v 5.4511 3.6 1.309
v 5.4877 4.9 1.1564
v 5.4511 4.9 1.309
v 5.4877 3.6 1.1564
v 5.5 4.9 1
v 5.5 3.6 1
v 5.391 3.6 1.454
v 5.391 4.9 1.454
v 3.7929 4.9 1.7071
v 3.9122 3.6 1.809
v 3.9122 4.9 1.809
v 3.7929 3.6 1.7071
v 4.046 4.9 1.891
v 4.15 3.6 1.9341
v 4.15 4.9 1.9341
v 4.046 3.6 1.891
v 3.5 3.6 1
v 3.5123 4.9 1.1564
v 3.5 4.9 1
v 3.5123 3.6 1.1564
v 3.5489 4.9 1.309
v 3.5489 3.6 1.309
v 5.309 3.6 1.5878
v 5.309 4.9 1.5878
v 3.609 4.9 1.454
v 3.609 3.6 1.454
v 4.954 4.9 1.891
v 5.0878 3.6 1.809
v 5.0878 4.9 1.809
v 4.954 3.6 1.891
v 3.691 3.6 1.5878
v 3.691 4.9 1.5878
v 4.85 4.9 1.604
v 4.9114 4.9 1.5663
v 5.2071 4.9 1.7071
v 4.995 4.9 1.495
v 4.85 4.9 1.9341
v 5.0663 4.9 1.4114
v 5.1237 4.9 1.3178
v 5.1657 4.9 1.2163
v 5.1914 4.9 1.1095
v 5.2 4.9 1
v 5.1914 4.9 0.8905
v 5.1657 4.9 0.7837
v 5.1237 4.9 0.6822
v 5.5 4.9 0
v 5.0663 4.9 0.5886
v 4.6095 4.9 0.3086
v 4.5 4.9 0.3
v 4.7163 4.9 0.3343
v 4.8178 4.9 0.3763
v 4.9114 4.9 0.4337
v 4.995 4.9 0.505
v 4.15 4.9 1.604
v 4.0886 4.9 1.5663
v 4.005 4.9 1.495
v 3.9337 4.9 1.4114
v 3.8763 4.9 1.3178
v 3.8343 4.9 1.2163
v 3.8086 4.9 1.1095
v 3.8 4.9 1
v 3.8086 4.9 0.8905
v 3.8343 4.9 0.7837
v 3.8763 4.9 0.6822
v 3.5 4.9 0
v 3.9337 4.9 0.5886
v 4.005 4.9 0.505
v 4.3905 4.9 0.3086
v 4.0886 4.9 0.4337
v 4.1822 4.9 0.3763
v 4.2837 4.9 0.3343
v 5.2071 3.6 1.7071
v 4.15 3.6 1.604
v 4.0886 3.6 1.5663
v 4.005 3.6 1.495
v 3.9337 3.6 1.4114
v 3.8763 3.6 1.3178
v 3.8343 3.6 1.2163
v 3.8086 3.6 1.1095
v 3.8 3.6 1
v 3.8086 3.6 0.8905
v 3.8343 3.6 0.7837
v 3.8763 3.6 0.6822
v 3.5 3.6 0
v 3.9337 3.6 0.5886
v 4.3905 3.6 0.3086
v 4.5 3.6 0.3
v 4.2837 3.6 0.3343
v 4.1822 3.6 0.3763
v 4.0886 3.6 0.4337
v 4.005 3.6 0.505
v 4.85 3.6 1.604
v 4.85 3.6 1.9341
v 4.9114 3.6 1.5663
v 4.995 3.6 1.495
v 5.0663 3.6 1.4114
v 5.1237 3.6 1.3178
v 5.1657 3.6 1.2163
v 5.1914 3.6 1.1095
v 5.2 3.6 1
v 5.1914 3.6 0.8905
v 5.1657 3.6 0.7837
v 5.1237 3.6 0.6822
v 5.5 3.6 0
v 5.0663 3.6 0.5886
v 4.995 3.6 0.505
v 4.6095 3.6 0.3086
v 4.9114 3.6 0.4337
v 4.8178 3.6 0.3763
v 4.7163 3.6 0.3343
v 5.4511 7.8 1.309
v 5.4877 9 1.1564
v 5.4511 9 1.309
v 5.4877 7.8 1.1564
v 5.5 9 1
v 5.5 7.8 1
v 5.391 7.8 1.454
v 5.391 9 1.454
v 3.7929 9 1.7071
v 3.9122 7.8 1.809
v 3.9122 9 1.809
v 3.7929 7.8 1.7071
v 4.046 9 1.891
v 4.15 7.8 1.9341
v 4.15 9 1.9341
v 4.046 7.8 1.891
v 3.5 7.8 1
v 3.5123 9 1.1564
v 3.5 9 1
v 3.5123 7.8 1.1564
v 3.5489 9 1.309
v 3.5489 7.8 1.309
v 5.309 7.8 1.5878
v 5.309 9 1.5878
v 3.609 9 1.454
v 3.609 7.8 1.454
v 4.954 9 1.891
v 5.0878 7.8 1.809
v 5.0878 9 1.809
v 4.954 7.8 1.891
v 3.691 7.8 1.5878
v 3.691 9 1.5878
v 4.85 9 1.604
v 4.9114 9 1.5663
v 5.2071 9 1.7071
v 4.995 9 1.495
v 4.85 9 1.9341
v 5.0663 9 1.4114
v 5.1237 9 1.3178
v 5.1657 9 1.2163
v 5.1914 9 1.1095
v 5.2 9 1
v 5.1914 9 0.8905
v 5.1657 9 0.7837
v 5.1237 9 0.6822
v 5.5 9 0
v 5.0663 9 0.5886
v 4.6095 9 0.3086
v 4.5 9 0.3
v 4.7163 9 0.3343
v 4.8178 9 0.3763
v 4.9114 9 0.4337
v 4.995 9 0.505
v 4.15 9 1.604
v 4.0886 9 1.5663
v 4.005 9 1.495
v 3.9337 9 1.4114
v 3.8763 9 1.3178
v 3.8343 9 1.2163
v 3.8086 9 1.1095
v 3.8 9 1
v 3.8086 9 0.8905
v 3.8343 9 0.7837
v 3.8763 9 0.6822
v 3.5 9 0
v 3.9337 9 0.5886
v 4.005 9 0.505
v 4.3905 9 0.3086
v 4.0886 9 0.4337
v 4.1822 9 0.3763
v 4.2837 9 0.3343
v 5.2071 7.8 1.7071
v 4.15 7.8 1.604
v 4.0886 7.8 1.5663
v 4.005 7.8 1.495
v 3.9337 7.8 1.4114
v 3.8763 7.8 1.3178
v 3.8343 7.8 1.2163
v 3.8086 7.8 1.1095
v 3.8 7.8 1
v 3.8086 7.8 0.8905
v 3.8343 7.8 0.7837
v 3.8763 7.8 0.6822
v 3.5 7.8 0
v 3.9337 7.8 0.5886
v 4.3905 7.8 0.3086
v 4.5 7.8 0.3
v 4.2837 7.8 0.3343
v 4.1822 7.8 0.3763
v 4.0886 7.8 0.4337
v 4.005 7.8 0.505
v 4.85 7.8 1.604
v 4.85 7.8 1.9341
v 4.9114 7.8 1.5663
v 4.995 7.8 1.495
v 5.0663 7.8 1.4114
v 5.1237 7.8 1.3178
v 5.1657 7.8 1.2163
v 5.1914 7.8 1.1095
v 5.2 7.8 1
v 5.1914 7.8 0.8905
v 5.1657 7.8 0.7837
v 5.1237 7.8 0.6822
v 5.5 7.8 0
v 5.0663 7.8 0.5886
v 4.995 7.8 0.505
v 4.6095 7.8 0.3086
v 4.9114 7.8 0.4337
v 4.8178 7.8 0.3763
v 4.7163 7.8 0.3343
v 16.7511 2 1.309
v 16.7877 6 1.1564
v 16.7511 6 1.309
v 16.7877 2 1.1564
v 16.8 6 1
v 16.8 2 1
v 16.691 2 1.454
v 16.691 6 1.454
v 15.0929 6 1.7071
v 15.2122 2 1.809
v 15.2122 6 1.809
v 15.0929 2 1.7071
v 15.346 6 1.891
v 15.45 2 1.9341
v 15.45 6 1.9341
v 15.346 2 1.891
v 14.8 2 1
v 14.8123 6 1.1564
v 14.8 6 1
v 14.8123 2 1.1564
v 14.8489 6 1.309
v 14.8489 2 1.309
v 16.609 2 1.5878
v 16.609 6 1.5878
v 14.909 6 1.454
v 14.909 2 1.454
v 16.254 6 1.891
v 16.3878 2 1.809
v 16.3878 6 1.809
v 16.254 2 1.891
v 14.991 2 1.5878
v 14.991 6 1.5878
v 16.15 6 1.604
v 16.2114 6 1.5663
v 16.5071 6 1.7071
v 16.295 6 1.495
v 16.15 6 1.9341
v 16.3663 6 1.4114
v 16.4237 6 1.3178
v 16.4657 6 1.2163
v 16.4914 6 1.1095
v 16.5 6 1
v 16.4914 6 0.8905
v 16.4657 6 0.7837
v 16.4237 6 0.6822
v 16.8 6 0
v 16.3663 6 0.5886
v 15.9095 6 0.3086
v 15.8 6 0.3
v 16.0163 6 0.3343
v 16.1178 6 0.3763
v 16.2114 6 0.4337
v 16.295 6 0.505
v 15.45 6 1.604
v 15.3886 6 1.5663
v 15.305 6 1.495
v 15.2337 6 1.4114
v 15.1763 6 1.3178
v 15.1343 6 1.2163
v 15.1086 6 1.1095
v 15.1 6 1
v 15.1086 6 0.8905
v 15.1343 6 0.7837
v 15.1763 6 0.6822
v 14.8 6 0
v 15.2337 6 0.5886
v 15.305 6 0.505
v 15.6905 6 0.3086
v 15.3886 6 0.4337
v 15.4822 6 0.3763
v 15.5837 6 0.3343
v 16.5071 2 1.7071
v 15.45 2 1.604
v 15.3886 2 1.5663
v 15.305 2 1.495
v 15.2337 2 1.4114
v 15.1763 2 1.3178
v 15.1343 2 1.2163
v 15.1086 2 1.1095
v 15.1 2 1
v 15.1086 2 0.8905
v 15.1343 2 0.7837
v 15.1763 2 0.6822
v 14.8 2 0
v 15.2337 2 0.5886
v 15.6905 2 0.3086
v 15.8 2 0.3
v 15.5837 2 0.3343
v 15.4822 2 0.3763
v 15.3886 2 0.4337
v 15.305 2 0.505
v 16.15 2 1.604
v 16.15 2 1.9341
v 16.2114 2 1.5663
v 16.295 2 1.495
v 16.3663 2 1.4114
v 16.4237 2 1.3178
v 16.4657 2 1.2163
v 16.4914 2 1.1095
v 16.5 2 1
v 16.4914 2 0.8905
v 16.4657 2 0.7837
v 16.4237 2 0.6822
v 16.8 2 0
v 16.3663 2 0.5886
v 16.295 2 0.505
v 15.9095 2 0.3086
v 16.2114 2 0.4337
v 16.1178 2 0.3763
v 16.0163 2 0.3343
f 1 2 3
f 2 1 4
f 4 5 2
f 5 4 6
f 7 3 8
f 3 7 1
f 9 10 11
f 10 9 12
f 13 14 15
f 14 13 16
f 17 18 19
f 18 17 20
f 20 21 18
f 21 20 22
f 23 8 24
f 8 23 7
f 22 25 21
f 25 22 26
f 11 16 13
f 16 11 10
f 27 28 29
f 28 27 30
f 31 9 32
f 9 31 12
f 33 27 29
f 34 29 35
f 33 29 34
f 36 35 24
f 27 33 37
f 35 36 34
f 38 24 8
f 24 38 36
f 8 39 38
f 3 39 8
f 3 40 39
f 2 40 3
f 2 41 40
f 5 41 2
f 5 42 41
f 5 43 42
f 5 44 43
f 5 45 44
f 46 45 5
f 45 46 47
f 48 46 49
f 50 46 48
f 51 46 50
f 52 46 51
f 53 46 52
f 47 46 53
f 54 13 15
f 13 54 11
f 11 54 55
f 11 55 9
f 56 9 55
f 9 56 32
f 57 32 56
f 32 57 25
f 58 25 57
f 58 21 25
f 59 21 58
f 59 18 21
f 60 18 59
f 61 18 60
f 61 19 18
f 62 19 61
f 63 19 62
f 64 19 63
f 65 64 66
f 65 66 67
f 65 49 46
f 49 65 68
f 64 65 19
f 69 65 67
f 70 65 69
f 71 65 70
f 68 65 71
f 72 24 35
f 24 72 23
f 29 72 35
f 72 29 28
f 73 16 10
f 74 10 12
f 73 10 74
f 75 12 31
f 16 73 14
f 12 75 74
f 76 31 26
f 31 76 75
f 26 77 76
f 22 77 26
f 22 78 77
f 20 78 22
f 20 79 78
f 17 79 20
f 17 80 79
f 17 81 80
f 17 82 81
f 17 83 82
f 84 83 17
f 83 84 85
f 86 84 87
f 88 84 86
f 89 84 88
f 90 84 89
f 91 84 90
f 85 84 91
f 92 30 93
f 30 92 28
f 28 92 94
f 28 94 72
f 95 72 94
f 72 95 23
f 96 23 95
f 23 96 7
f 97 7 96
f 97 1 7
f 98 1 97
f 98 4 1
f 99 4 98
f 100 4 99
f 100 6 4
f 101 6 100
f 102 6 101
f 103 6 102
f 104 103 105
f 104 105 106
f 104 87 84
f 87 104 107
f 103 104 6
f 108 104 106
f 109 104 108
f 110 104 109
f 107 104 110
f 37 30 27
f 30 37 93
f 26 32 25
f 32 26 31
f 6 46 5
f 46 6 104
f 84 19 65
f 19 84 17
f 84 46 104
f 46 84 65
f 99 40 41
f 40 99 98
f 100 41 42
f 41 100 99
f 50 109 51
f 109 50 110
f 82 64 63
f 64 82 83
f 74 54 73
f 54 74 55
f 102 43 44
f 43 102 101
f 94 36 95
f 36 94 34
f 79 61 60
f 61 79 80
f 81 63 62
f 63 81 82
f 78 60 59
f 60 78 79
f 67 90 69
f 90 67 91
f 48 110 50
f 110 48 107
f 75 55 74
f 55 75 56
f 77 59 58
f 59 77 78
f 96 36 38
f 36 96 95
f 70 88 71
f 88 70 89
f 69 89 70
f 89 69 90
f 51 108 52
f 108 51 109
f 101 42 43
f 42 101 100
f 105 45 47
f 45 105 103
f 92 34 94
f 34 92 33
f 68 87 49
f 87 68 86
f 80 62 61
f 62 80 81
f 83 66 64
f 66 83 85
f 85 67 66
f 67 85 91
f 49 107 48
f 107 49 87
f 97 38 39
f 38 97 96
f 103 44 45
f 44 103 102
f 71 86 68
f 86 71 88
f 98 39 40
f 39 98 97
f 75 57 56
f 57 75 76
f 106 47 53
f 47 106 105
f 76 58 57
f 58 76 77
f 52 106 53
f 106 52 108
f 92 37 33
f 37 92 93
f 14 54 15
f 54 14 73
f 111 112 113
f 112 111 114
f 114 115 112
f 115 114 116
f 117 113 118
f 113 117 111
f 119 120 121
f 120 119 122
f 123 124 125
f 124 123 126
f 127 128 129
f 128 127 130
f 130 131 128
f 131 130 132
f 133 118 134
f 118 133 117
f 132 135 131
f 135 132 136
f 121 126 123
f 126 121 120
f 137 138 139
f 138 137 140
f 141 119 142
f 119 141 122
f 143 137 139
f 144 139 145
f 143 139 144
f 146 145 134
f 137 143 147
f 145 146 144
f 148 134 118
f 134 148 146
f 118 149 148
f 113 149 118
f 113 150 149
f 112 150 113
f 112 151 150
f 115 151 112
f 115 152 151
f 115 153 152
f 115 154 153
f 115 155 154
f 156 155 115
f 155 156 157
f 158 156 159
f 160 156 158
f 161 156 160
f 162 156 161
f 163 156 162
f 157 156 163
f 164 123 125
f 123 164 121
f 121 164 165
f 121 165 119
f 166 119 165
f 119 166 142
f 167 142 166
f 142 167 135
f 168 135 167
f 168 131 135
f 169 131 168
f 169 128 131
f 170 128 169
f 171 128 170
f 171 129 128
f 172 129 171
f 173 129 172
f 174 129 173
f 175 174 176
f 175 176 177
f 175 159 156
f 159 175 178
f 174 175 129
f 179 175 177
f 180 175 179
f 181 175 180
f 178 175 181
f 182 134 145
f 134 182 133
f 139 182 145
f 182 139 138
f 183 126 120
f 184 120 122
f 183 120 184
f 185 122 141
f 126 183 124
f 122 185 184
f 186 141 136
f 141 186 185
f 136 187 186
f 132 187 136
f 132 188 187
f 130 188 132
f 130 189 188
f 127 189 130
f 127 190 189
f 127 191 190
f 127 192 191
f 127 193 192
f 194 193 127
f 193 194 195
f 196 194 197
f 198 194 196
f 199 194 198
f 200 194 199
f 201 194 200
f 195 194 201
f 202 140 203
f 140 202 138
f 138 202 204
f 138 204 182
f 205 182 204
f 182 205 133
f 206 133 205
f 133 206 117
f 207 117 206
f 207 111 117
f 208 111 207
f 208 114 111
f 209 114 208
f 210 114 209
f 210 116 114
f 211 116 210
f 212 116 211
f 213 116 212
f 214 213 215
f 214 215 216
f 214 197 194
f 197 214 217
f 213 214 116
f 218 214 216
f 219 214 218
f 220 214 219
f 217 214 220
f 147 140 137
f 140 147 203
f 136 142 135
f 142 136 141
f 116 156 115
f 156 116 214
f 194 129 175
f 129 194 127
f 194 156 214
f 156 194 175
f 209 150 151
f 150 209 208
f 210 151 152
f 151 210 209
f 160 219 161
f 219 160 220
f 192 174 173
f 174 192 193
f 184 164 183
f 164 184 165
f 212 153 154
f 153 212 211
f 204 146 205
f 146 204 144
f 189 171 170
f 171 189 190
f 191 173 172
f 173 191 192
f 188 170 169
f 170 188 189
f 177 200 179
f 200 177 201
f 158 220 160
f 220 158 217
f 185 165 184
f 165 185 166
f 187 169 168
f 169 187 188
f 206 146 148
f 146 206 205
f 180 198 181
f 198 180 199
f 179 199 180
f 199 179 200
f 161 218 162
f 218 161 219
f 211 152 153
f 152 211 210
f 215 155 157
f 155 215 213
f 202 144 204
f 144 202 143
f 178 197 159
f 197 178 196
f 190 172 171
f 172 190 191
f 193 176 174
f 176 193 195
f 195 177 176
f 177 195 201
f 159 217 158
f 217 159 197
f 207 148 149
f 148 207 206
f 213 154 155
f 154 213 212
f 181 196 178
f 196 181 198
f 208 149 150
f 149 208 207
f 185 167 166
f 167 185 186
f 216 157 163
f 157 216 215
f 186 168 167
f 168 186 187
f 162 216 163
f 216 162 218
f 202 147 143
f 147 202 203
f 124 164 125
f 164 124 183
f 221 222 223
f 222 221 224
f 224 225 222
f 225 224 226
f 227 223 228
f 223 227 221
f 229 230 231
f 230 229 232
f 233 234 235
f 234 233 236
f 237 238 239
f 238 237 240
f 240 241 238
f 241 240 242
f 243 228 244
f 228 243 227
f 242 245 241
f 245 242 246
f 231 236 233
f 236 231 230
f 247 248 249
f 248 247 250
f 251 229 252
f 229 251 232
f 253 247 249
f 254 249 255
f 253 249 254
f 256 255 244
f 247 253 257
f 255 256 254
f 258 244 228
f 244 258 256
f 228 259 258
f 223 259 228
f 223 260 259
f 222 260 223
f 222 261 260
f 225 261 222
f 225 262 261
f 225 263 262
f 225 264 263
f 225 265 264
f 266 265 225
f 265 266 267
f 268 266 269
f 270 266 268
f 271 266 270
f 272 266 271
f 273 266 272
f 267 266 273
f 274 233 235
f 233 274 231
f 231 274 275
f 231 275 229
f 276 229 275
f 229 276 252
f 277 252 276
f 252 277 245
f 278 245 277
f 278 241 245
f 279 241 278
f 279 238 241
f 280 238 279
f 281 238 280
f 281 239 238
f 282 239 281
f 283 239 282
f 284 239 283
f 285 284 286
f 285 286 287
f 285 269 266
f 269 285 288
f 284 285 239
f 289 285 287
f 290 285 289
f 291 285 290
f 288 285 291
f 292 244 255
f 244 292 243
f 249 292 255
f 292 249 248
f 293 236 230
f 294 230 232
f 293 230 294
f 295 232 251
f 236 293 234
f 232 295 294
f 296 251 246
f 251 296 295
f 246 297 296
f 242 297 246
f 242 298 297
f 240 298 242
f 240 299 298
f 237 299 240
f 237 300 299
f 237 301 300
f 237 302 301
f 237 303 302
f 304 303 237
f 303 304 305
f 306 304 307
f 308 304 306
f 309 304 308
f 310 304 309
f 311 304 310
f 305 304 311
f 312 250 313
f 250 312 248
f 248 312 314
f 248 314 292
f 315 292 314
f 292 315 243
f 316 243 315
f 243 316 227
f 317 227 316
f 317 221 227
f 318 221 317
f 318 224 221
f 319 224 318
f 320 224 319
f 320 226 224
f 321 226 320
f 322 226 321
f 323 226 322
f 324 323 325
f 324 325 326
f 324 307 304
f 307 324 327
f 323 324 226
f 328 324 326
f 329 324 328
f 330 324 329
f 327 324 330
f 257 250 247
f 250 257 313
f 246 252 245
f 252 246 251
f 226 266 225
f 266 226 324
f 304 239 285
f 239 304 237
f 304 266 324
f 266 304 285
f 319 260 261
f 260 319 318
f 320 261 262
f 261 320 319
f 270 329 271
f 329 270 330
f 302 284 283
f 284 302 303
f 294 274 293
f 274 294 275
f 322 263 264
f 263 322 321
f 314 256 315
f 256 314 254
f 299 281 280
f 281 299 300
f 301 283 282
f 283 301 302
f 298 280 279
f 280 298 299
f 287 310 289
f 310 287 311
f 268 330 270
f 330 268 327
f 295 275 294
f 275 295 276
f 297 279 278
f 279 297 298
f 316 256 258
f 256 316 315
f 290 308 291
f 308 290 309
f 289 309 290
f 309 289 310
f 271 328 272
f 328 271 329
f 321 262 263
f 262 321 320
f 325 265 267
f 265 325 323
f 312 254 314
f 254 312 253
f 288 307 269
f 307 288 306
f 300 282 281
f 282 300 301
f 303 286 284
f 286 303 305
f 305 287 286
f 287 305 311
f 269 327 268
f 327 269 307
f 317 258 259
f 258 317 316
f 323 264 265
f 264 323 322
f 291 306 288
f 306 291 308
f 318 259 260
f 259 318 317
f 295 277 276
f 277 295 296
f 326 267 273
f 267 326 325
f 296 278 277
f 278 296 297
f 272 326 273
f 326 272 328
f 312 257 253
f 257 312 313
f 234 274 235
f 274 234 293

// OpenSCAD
$fn=40;
th = .7;
translate([18,0,0])
scale([.25,.25,1])
rotate([0,180,0])
linear_extrude(height=.5)
import("lr.dxf");

module fast()
{
translate([0,0,1])
rotate([90,0,0])
difference()
{
union()
{
cylinder(r=1, h=2);
translate([-1,-1,0])
cube([2,1,2]);
}
union()
{
translate([0,0,-.1])
cylinder(r=.7, h=3);

translate([-th/2,th/2,0])
cube([th,2,4]);

}
}

}
//R middle
translate([4.5,4.9,0])
scale([1,.65,1])
fast();

//R top
translate([4.5,9,0])
scale([1,.6,1])
fast();


/*
//L bottom
translate([15.8,1.9,0])
scale([1,2,1])
fast();

*/

//L top
translate([15.8,6,0])
scale([1,2,1])
fast();
